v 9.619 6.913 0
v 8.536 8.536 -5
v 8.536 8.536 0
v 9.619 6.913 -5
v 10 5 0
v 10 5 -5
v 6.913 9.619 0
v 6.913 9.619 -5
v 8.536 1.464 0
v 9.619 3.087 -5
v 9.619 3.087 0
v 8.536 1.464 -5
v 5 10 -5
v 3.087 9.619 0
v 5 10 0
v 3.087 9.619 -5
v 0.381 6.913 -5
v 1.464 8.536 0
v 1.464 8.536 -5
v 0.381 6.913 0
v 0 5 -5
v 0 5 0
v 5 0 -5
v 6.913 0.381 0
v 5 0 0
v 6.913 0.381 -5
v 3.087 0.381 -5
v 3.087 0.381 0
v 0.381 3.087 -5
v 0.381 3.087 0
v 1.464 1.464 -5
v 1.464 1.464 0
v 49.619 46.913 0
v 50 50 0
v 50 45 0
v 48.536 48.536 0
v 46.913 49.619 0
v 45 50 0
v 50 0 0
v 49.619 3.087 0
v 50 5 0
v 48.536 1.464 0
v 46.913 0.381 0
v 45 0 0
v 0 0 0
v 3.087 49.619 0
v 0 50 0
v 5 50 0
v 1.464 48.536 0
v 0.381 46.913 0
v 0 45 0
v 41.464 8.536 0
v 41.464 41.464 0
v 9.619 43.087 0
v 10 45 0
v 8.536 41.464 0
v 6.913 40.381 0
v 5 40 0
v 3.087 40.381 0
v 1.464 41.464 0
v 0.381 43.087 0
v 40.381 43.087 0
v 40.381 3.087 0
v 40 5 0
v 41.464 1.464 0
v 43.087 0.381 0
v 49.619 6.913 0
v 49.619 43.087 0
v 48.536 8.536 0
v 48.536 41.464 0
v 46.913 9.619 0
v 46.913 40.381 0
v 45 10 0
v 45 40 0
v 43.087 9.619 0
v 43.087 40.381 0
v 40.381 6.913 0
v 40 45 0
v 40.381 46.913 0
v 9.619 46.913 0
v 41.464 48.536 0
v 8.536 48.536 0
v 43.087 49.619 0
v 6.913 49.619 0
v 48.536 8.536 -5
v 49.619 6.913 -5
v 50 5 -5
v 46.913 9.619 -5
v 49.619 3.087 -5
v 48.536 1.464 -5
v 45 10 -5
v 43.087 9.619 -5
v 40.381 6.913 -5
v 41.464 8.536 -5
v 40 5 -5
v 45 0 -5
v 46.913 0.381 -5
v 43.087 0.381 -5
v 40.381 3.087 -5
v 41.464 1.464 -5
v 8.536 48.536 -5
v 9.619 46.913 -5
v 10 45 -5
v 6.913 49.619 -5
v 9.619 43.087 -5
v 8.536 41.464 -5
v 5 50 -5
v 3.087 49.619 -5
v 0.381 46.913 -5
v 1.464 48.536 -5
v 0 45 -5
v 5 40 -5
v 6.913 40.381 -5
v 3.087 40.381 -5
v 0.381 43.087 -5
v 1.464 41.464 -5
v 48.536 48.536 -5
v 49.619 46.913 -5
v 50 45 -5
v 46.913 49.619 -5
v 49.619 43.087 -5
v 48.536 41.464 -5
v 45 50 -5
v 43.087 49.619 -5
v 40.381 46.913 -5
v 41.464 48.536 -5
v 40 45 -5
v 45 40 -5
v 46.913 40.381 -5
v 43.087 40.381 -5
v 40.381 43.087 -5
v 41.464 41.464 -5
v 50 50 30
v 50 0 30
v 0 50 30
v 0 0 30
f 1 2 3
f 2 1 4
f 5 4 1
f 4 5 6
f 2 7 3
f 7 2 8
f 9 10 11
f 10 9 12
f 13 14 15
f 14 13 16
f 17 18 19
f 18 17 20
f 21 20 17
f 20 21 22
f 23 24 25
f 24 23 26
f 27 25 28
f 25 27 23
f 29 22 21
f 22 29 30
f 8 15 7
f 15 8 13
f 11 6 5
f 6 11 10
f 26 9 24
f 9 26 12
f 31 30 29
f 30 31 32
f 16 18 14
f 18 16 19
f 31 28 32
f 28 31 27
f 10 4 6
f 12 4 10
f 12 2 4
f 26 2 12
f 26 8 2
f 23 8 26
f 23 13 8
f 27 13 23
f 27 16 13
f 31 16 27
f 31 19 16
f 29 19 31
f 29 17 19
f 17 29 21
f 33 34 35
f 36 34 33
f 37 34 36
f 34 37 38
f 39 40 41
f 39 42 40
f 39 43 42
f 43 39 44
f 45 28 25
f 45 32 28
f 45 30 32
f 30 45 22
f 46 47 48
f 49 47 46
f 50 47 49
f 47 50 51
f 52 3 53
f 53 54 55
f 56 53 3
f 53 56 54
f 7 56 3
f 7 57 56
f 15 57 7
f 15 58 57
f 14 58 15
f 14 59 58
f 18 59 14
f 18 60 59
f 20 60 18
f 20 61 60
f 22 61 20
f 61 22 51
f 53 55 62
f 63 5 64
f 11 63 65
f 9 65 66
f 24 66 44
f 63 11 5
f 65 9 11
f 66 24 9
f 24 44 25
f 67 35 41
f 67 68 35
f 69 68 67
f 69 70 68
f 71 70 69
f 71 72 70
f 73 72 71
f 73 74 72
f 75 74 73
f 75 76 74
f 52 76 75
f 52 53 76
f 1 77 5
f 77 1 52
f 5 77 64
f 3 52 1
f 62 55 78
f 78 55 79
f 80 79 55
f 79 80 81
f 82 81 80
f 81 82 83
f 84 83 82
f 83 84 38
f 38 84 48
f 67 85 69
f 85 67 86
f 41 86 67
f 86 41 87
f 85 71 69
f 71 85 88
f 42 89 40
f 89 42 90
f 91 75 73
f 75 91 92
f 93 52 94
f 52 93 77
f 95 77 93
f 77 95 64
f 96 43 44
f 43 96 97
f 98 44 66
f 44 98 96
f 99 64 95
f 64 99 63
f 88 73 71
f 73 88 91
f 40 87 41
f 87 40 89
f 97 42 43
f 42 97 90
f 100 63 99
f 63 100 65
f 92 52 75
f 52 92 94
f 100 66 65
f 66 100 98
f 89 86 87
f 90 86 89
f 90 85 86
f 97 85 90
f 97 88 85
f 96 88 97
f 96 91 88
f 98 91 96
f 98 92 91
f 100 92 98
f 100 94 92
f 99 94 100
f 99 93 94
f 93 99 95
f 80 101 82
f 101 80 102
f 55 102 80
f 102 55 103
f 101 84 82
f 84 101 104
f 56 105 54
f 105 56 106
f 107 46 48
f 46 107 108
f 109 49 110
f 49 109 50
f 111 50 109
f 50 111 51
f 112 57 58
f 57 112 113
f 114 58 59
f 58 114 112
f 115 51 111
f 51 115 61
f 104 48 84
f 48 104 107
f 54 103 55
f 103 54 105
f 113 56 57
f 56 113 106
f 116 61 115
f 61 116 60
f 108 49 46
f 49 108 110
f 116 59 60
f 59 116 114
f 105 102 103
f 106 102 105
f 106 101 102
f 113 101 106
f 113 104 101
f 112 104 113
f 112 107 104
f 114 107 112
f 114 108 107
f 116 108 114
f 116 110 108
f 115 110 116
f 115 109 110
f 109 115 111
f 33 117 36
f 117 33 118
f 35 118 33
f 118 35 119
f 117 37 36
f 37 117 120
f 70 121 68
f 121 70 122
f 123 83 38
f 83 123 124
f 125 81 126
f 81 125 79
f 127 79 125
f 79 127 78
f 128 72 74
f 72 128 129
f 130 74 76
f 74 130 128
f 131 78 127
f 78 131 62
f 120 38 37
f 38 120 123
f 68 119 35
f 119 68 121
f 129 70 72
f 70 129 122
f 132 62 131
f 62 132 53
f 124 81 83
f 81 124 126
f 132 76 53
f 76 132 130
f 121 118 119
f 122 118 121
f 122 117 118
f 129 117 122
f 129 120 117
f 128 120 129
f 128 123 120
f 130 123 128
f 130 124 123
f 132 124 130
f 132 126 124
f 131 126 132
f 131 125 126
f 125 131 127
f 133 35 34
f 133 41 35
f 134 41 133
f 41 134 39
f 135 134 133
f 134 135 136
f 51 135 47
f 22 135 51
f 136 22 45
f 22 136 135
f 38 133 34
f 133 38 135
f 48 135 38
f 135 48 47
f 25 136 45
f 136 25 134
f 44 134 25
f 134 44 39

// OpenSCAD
// Parámetros
soportes = true;  // Cambiar a false para desactivarlos

module caja() {
    cube([50, 50, 30]);  // Caja base
}

// Soportes opcionales en las esquinas
module soporte() {
    cylinder(h=5, d=10);
}

// Ensamblaje
caja();

// Agregar soportes solo si están activados
if (soportes) {
    translate([5, 5, -5]) soporte();
    translate([45, 5, -5]) soporte();
    translate([5, 45, -5]) soporte();
    translate([45, 45, -5]) soporte();
}
